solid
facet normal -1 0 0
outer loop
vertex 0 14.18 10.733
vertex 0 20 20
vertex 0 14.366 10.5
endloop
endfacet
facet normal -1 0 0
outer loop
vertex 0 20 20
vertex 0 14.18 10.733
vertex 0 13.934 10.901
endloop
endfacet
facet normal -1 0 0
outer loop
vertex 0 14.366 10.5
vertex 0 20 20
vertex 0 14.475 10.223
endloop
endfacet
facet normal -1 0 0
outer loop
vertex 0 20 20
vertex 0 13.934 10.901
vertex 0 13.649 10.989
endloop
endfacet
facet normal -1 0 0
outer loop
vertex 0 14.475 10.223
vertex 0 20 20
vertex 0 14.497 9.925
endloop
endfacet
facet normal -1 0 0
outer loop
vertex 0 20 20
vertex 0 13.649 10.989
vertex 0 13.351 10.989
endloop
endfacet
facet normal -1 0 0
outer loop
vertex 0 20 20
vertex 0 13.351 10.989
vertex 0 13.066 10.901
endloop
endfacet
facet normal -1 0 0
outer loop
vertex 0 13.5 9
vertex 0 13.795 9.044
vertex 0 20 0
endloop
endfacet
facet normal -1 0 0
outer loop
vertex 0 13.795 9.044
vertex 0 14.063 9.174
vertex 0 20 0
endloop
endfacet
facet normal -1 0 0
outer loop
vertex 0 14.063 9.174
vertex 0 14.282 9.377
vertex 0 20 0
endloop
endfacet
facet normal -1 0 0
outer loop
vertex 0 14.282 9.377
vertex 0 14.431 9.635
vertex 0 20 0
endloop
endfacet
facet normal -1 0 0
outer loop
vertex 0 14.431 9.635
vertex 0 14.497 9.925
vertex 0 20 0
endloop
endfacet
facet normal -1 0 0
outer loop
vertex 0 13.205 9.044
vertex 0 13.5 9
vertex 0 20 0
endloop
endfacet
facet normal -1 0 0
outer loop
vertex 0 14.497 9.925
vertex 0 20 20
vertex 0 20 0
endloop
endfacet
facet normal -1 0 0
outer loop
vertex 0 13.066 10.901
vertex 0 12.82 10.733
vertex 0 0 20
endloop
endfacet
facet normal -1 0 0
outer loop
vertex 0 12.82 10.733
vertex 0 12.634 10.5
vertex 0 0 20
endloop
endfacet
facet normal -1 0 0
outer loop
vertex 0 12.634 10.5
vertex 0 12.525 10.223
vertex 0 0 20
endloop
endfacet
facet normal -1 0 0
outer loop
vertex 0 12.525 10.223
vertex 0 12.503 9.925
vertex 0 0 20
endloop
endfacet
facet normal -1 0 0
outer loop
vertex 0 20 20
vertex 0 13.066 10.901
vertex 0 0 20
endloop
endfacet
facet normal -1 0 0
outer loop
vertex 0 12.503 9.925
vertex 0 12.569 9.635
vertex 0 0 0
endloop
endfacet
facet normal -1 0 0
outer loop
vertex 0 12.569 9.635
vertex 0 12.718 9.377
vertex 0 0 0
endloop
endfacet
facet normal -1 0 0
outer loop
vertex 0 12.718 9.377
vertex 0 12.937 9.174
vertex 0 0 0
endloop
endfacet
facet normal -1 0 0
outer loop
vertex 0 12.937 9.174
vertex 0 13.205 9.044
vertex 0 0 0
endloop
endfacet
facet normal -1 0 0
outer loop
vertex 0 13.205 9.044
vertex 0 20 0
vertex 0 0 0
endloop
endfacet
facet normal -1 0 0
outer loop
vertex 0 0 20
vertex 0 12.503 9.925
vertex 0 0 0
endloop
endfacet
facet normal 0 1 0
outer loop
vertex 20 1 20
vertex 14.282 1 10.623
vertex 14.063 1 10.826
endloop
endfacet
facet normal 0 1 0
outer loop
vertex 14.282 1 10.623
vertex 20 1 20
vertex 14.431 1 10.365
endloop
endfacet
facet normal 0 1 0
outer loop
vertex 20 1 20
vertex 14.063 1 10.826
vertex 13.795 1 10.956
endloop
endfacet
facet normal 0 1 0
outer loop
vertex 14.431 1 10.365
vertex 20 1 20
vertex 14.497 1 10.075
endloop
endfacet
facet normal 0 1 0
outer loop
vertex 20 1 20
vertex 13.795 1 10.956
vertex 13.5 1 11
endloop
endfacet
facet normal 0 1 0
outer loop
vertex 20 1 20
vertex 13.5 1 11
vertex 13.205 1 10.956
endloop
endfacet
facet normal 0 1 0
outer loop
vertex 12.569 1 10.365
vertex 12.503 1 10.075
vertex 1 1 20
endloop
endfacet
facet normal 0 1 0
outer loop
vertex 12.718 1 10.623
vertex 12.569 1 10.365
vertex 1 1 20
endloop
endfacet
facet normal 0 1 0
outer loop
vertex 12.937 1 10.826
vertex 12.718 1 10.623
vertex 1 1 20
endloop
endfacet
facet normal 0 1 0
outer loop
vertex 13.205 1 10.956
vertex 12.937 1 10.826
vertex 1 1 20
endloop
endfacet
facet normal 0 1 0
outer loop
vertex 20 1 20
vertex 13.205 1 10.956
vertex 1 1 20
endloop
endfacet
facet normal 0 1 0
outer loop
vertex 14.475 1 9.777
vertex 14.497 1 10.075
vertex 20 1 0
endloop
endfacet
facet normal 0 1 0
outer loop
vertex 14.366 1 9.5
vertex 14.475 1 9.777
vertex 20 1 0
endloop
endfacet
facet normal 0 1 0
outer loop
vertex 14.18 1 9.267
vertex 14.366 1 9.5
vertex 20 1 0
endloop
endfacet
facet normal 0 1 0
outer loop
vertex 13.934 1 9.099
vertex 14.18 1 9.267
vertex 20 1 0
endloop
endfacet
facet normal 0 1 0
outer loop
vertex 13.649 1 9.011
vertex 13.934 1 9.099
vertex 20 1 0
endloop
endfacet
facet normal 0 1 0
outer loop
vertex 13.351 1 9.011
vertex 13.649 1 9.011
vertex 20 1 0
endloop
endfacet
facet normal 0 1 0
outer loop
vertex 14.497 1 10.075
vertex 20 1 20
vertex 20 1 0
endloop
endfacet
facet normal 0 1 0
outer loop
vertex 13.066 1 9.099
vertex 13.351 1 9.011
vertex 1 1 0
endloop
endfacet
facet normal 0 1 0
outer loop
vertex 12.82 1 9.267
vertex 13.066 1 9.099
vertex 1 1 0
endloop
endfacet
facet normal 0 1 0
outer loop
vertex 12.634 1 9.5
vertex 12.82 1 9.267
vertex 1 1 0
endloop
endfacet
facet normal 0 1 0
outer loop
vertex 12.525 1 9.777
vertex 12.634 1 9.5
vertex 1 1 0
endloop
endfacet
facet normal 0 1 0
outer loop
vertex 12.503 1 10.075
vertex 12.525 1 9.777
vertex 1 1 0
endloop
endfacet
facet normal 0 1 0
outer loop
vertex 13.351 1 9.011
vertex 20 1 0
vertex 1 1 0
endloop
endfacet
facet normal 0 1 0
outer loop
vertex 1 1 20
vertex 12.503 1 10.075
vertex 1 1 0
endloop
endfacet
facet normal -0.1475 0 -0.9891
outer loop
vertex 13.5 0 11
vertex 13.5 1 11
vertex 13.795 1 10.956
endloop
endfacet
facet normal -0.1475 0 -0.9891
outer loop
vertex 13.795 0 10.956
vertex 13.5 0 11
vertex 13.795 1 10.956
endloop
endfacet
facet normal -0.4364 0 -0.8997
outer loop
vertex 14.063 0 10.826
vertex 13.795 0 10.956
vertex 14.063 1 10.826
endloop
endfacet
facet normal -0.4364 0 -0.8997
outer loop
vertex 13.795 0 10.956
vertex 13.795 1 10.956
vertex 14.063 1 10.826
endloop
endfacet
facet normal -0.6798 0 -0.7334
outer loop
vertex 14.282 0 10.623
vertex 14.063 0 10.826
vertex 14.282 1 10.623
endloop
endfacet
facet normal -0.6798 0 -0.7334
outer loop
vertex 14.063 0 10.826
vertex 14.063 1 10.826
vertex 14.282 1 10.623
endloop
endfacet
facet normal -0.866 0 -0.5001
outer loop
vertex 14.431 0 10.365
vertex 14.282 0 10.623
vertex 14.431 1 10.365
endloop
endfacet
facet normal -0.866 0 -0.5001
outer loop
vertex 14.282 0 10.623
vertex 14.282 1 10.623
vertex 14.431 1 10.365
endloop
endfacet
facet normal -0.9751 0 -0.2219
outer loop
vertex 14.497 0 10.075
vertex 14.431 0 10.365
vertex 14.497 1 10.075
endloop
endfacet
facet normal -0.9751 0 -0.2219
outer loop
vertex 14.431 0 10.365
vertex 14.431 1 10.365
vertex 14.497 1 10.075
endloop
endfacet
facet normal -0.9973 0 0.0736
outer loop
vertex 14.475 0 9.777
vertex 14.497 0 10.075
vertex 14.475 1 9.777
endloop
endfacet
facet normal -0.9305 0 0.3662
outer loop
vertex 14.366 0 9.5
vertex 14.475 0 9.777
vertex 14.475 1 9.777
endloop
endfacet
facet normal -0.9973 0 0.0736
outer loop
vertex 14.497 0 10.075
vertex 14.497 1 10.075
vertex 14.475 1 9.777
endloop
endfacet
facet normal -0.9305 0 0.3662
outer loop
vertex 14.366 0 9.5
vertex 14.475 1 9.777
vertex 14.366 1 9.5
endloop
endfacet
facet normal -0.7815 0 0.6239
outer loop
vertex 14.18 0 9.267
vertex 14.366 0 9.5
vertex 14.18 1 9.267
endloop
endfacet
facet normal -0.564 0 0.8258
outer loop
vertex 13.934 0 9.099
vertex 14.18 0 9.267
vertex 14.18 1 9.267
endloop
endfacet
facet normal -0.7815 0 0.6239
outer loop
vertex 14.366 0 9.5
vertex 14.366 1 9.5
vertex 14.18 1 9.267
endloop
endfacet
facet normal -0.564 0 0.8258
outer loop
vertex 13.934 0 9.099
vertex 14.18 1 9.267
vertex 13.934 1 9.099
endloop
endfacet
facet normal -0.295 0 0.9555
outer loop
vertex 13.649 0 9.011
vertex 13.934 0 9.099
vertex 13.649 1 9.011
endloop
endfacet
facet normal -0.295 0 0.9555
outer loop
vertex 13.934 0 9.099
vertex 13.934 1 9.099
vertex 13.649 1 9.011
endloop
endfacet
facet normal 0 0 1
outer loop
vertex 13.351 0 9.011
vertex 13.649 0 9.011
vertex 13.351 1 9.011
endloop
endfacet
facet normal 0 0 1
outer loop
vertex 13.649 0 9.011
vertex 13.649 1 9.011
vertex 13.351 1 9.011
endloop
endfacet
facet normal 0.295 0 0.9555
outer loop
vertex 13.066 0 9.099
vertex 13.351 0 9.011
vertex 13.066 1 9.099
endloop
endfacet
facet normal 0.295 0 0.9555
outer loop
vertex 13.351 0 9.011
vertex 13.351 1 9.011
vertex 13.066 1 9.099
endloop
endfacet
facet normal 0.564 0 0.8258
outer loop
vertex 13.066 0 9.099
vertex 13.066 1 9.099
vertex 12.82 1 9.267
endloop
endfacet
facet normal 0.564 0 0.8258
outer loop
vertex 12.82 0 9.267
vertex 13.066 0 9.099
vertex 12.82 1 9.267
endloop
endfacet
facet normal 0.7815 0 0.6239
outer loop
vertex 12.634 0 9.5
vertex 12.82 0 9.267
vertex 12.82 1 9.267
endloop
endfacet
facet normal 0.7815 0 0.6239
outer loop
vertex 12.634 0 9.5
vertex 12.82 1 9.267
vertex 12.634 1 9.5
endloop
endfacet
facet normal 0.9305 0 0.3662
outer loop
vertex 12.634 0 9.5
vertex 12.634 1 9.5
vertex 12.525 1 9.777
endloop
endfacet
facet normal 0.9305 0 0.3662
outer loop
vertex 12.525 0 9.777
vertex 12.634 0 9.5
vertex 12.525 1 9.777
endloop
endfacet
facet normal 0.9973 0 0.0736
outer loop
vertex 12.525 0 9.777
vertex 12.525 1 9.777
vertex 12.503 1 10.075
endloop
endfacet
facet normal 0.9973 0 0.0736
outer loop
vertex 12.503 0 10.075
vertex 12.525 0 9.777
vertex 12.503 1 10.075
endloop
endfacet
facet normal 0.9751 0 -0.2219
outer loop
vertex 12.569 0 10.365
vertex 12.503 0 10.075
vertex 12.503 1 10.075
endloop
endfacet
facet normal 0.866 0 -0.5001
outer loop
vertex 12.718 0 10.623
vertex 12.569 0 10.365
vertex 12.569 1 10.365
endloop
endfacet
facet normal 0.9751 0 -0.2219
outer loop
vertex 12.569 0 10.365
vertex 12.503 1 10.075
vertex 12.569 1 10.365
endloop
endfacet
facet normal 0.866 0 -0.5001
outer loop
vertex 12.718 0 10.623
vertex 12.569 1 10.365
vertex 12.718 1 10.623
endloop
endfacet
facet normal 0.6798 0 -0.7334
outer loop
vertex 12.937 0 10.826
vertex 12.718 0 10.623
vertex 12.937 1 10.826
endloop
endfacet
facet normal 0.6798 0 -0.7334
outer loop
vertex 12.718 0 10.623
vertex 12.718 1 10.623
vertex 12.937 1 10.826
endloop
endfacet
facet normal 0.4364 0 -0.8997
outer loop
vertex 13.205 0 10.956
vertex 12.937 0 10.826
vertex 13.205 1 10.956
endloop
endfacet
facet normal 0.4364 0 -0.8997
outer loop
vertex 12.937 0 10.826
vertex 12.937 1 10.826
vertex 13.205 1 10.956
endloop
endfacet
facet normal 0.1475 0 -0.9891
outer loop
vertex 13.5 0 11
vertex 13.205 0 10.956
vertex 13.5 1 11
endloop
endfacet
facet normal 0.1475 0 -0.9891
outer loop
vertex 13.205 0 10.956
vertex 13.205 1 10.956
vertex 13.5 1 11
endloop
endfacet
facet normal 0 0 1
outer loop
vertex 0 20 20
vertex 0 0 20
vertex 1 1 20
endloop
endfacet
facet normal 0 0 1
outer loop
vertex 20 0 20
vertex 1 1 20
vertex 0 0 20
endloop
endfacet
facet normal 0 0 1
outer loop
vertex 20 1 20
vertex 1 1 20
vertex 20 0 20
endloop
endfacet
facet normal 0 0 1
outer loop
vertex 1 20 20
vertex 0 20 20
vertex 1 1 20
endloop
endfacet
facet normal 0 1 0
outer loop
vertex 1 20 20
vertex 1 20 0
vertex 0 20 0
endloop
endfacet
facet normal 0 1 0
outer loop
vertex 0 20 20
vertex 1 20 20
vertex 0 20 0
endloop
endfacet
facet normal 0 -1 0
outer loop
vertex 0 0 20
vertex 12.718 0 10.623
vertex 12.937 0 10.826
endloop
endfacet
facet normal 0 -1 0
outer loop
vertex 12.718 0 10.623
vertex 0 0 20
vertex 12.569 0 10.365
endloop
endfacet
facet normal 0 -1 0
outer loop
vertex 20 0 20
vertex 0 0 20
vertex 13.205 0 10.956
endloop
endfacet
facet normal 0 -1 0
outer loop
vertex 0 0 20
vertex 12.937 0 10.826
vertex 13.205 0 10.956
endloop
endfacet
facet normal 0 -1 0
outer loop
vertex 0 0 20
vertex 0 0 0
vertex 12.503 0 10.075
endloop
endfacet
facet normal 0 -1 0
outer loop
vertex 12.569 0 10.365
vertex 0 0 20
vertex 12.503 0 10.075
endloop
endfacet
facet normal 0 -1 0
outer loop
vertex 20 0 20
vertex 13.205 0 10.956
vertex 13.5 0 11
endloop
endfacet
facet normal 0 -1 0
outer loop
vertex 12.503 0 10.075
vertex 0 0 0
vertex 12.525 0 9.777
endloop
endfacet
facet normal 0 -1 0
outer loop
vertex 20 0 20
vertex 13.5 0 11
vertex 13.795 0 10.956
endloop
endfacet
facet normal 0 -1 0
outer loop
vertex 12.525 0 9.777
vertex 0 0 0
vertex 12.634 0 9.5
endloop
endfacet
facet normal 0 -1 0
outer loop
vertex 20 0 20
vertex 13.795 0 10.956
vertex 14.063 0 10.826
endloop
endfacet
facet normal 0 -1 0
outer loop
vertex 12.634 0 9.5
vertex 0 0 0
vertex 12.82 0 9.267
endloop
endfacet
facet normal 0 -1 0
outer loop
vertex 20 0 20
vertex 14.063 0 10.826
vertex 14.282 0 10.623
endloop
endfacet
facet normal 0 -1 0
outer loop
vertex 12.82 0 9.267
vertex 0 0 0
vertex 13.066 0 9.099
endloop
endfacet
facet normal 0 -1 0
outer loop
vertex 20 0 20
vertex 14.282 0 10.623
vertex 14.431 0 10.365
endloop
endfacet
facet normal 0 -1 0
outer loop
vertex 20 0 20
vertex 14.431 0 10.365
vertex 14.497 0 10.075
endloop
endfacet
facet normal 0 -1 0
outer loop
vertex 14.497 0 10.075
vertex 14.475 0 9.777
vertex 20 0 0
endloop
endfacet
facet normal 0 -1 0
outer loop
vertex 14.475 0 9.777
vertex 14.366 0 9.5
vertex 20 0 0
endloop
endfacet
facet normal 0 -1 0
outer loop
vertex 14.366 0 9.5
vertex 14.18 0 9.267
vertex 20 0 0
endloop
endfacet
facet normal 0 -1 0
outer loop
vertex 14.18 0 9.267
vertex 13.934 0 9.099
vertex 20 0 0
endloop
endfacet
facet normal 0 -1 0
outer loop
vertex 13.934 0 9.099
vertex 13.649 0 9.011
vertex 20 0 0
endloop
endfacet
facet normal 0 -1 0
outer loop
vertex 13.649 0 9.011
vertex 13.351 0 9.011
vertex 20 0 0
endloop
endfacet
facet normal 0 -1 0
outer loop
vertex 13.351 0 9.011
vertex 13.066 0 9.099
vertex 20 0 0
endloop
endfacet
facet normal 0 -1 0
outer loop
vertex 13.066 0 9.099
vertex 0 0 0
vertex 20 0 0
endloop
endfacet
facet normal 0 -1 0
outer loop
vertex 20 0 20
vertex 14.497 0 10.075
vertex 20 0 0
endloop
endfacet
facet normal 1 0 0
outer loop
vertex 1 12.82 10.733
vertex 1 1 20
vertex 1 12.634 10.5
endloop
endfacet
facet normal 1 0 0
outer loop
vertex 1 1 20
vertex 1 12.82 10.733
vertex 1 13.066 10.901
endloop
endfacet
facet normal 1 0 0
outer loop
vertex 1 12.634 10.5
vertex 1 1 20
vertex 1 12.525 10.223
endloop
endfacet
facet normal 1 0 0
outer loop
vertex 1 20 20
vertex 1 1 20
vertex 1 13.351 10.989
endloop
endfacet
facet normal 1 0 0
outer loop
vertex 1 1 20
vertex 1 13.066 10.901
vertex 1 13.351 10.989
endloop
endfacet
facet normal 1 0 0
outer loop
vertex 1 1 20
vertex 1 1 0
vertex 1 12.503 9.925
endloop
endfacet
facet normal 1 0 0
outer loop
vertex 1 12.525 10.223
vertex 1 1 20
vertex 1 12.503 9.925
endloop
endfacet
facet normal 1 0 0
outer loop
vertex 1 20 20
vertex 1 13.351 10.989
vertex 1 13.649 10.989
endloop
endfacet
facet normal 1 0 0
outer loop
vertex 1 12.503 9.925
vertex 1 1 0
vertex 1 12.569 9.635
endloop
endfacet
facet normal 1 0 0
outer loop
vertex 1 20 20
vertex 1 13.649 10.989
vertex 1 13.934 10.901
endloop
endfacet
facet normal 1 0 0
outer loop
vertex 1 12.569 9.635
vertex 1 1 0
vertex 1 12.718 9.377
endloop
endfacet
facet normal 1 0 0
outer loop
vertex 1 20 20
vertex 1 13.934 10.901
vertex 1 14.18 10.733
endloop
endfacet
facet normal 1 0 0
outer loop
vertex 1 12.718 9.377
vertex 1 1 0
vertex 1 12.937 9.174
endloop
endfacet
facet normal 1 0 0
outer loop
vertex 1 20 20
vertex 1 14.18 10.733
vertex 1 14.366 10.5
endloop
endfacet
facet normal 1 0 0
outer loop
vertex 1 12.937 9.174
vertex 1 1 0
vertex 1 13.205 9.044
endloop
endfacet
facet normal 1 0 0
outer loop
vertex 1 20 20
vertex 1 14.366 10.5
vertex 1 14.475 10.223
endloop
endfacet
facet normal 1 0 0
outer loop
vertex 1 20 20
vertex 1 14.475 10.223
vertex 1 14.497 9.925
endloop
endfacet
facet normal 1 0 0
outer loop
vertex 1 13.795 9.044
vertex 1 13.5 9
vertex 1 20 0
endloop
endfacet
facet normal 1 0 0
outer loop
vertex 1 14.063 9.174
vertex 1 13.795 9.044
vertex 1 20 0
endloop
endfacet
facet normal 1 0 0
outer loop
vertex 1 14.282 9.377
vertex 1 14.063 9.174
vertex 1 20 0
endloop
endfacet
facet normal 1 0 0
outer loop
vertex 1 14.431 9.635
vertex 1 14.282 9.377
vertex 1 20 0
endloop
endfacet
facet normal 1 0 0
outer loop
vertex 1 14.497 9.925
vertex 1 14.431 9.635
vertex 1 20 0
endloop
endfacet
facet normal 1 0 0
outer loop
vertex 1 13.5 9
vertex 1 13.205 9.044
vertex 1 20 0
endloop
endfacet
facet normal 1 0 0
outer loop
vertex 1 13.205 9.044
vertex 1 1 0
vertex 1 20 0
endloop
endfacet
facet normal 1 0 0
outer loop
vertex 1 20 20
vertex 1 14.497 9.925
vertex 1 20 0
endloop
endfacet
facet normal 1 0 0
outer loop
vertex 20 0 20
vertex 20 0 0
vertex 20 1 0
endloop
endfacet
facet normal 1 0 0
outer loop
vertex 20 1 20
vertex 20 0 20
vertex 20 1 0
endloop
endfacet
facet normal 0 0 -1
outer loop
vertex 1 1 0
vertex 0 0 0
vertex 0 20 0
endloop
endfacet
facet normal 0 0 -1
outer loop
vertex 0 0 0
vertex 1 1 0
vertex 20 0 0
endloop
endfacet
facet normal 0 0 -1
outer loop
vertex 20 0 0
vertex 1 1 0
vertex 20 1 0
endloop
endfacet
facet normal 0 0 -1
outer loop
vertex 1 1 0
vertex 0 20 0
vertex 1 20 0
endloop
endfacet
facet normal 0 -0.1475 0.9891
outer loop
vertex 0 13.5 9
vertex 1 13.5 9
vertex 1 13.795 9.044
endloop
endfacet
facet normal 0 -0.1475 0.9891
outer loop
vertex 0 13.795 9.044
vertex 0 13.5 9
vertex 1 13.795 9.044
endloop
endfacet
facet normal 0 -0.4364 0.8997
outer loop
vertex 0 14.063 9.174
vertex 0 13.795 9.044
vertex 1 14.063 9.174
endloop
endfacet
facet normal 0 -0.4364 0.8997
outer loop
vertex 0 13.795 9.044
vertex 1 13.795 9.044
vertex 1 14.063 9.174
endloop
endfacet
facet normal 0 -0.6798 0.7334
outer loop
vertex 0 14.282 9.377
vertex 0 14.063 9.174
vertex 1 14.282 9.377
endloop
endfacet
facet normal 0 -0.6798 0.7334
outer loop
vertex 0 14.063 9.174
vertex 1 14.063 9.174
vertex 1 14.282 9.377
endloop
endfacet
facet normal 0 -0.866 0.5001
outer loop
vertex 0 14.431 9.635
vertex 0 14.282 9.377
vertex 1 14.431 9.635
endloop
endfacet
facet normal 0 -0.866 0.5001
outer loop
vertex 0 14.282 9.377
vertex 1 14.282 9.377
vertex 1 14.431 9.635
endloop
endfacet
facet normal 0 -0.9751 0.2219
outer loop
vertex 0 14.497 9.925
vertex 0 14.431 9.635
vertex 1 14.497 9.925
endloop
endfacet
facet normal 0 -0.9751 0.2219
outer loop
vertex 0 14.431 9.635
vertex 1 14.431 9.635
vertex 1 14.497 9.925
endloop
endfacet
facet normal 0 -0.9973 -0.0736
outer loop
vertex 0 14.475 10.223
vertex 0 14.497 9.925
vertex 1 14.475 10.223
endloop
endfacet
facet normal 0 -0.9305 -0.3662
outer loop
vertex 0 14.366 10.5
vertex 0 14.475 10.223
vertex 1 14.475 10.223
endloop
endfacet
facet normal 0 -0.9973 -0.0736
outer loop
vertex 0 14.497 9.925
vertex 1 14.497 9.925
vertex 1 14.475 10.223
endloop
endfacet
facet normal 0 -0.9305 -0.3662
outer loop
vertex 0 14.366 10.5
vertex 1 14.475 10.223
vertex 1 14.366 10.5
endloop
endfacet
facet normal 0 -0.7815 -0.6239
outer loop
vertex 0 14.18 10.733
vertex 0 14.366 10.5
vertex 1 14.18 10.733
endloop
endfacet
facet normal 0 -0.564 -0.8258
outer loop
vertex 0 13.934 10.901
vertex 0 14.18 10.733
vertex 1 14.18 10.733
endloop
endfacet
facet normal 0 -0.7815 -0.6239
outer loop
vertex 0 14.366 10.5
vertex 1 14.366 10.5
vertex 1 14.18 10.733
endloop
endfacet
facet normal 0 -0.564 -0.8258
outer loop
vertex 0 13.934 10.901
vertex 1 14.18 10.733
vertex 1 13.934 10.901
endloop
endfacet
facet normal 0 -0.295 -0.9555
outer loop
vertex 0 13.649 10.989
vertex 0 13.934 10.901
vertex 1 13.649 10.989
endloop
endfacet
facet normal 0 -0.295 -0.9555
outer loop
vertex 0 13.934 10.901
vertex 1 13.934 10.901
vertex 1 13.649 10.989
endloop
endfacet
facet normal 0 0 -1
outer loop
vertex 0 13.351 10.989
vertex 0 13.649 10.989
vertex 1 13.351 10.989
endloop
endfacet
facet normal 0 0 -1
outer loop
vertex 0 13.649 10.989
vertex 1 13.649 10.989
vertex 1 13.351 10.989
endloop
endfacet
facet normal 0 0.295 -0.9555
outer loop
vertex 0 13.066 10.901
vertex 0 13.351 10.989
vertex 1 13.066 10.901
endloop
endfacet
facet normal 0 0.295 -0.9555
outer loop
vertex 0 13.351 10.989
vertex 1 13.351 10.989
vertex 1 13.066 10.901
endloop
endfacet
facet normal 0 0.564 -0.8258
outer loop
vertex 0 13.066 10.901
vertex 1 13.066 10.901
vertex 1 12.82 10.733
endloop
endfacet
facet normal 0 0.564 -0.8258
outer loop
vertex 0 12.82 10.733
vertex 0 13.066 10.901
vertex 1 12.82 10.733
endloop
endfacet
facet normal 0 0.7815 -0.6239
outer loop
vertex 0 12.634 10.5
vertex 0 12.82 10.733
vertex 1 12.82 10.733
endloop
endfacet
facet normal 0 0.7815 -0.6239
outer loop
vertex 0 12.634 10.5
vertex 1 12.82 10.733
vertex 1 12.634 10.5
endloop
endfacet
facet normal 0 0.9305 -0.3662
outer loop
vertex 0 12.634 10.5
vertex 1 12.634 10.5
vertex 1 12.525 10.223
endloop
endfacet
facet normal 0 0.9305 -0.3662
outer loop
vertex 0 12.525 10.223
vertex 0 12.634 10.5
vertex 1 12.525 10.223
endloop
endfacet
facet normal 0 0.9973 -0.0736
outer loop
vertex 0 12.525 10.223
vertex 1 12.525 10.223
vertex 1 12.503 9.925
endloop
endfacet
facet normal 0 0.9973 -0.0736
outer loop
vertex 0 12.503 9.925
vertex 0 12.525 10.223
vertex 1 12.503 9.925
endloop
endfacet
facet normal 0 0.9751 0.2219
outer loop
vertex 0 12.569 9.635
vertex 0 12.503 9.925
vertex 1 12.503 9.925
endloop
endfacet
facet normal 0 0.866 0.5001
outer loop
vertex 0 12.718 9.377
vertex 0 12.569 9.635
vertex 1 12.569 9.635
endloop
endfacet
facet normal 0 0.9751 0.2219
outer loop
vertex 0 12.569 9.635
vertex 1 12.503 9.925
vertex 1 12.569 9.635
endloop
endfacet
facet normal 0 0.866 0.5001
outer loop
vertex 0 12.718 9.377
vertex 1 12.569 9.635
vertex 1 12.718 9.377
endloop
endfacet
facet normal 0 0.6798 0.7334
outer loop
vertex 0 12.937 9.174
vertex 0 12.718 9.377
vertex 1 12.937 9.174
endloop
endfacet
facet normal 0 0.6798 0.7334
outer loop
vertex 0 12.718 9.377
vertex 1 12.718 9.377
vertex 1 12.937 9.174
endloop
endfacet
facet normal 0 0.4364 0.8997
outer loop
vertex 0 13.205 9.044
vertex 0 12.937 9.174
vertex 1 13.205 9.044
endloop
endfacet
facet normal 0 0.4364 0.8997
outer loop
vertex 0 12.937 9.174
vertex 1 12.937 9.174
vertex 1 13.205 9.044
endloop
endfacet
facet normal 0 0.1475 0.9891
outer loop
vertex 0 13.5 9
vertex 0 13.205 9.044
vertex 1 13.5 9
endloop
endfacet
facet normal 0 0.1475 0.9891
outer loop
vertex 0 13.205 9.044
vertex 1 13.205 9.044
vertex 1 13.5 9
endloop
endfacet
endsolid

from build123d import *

# Parameters (mm, degrees)
EXTRU_MINCE1_DEPTH      = 20
ESQUISSE2_R             = 1
ENL_V_MAT_EXTRU_1_DEPTH = 1
ESQUISSE3_R             = 1
ENL_V_MAT_EXTRU_2_DEPTH = 1


with BuildPart() as part:
    # Esquisse1 → Extru.-Mince1 (new body)
    with BuildSketch(Plane.XY):
        Polygon((0, 20), (0, 0), (20, 0), (20, 1), (1, 1), (1, 20), align=None)
    extrude(amount=EXTRU_MINCE1_DEPTH)

    # Esquisse2 → Enlèv. mat.-Extru.1 (cut)
    with BuildSketch(Plane(origin=(1, 0, 0), x_dir=(0, 0, -1), z_dir=(1, 0, 0))):
        with Locations((-10, 13.5)):
            Circle(ESQUISSE2_R)
    extrude(amount=-ENL_V_MAT_EXTRU_1_DEPTH, mode=Mode.SUBTRACT)

    # Esquisse3 → Enlèv. mat.-Extru.2 (cut)
    with BuildSketch(Plane(origin=(0, 1, 0), x_dir=(1, 0, 0), z_dir=(0, 1, 0))):
        with Locations(Location((13.5, -10, 0), (0, 0, 270))):
            Circle(ESQUISSE3_R)
    extrude(amount=-ENL_V_MAT_EXTRU_2_DEPTH, mode=Mode.SUBTRACT)


solid = part.part
